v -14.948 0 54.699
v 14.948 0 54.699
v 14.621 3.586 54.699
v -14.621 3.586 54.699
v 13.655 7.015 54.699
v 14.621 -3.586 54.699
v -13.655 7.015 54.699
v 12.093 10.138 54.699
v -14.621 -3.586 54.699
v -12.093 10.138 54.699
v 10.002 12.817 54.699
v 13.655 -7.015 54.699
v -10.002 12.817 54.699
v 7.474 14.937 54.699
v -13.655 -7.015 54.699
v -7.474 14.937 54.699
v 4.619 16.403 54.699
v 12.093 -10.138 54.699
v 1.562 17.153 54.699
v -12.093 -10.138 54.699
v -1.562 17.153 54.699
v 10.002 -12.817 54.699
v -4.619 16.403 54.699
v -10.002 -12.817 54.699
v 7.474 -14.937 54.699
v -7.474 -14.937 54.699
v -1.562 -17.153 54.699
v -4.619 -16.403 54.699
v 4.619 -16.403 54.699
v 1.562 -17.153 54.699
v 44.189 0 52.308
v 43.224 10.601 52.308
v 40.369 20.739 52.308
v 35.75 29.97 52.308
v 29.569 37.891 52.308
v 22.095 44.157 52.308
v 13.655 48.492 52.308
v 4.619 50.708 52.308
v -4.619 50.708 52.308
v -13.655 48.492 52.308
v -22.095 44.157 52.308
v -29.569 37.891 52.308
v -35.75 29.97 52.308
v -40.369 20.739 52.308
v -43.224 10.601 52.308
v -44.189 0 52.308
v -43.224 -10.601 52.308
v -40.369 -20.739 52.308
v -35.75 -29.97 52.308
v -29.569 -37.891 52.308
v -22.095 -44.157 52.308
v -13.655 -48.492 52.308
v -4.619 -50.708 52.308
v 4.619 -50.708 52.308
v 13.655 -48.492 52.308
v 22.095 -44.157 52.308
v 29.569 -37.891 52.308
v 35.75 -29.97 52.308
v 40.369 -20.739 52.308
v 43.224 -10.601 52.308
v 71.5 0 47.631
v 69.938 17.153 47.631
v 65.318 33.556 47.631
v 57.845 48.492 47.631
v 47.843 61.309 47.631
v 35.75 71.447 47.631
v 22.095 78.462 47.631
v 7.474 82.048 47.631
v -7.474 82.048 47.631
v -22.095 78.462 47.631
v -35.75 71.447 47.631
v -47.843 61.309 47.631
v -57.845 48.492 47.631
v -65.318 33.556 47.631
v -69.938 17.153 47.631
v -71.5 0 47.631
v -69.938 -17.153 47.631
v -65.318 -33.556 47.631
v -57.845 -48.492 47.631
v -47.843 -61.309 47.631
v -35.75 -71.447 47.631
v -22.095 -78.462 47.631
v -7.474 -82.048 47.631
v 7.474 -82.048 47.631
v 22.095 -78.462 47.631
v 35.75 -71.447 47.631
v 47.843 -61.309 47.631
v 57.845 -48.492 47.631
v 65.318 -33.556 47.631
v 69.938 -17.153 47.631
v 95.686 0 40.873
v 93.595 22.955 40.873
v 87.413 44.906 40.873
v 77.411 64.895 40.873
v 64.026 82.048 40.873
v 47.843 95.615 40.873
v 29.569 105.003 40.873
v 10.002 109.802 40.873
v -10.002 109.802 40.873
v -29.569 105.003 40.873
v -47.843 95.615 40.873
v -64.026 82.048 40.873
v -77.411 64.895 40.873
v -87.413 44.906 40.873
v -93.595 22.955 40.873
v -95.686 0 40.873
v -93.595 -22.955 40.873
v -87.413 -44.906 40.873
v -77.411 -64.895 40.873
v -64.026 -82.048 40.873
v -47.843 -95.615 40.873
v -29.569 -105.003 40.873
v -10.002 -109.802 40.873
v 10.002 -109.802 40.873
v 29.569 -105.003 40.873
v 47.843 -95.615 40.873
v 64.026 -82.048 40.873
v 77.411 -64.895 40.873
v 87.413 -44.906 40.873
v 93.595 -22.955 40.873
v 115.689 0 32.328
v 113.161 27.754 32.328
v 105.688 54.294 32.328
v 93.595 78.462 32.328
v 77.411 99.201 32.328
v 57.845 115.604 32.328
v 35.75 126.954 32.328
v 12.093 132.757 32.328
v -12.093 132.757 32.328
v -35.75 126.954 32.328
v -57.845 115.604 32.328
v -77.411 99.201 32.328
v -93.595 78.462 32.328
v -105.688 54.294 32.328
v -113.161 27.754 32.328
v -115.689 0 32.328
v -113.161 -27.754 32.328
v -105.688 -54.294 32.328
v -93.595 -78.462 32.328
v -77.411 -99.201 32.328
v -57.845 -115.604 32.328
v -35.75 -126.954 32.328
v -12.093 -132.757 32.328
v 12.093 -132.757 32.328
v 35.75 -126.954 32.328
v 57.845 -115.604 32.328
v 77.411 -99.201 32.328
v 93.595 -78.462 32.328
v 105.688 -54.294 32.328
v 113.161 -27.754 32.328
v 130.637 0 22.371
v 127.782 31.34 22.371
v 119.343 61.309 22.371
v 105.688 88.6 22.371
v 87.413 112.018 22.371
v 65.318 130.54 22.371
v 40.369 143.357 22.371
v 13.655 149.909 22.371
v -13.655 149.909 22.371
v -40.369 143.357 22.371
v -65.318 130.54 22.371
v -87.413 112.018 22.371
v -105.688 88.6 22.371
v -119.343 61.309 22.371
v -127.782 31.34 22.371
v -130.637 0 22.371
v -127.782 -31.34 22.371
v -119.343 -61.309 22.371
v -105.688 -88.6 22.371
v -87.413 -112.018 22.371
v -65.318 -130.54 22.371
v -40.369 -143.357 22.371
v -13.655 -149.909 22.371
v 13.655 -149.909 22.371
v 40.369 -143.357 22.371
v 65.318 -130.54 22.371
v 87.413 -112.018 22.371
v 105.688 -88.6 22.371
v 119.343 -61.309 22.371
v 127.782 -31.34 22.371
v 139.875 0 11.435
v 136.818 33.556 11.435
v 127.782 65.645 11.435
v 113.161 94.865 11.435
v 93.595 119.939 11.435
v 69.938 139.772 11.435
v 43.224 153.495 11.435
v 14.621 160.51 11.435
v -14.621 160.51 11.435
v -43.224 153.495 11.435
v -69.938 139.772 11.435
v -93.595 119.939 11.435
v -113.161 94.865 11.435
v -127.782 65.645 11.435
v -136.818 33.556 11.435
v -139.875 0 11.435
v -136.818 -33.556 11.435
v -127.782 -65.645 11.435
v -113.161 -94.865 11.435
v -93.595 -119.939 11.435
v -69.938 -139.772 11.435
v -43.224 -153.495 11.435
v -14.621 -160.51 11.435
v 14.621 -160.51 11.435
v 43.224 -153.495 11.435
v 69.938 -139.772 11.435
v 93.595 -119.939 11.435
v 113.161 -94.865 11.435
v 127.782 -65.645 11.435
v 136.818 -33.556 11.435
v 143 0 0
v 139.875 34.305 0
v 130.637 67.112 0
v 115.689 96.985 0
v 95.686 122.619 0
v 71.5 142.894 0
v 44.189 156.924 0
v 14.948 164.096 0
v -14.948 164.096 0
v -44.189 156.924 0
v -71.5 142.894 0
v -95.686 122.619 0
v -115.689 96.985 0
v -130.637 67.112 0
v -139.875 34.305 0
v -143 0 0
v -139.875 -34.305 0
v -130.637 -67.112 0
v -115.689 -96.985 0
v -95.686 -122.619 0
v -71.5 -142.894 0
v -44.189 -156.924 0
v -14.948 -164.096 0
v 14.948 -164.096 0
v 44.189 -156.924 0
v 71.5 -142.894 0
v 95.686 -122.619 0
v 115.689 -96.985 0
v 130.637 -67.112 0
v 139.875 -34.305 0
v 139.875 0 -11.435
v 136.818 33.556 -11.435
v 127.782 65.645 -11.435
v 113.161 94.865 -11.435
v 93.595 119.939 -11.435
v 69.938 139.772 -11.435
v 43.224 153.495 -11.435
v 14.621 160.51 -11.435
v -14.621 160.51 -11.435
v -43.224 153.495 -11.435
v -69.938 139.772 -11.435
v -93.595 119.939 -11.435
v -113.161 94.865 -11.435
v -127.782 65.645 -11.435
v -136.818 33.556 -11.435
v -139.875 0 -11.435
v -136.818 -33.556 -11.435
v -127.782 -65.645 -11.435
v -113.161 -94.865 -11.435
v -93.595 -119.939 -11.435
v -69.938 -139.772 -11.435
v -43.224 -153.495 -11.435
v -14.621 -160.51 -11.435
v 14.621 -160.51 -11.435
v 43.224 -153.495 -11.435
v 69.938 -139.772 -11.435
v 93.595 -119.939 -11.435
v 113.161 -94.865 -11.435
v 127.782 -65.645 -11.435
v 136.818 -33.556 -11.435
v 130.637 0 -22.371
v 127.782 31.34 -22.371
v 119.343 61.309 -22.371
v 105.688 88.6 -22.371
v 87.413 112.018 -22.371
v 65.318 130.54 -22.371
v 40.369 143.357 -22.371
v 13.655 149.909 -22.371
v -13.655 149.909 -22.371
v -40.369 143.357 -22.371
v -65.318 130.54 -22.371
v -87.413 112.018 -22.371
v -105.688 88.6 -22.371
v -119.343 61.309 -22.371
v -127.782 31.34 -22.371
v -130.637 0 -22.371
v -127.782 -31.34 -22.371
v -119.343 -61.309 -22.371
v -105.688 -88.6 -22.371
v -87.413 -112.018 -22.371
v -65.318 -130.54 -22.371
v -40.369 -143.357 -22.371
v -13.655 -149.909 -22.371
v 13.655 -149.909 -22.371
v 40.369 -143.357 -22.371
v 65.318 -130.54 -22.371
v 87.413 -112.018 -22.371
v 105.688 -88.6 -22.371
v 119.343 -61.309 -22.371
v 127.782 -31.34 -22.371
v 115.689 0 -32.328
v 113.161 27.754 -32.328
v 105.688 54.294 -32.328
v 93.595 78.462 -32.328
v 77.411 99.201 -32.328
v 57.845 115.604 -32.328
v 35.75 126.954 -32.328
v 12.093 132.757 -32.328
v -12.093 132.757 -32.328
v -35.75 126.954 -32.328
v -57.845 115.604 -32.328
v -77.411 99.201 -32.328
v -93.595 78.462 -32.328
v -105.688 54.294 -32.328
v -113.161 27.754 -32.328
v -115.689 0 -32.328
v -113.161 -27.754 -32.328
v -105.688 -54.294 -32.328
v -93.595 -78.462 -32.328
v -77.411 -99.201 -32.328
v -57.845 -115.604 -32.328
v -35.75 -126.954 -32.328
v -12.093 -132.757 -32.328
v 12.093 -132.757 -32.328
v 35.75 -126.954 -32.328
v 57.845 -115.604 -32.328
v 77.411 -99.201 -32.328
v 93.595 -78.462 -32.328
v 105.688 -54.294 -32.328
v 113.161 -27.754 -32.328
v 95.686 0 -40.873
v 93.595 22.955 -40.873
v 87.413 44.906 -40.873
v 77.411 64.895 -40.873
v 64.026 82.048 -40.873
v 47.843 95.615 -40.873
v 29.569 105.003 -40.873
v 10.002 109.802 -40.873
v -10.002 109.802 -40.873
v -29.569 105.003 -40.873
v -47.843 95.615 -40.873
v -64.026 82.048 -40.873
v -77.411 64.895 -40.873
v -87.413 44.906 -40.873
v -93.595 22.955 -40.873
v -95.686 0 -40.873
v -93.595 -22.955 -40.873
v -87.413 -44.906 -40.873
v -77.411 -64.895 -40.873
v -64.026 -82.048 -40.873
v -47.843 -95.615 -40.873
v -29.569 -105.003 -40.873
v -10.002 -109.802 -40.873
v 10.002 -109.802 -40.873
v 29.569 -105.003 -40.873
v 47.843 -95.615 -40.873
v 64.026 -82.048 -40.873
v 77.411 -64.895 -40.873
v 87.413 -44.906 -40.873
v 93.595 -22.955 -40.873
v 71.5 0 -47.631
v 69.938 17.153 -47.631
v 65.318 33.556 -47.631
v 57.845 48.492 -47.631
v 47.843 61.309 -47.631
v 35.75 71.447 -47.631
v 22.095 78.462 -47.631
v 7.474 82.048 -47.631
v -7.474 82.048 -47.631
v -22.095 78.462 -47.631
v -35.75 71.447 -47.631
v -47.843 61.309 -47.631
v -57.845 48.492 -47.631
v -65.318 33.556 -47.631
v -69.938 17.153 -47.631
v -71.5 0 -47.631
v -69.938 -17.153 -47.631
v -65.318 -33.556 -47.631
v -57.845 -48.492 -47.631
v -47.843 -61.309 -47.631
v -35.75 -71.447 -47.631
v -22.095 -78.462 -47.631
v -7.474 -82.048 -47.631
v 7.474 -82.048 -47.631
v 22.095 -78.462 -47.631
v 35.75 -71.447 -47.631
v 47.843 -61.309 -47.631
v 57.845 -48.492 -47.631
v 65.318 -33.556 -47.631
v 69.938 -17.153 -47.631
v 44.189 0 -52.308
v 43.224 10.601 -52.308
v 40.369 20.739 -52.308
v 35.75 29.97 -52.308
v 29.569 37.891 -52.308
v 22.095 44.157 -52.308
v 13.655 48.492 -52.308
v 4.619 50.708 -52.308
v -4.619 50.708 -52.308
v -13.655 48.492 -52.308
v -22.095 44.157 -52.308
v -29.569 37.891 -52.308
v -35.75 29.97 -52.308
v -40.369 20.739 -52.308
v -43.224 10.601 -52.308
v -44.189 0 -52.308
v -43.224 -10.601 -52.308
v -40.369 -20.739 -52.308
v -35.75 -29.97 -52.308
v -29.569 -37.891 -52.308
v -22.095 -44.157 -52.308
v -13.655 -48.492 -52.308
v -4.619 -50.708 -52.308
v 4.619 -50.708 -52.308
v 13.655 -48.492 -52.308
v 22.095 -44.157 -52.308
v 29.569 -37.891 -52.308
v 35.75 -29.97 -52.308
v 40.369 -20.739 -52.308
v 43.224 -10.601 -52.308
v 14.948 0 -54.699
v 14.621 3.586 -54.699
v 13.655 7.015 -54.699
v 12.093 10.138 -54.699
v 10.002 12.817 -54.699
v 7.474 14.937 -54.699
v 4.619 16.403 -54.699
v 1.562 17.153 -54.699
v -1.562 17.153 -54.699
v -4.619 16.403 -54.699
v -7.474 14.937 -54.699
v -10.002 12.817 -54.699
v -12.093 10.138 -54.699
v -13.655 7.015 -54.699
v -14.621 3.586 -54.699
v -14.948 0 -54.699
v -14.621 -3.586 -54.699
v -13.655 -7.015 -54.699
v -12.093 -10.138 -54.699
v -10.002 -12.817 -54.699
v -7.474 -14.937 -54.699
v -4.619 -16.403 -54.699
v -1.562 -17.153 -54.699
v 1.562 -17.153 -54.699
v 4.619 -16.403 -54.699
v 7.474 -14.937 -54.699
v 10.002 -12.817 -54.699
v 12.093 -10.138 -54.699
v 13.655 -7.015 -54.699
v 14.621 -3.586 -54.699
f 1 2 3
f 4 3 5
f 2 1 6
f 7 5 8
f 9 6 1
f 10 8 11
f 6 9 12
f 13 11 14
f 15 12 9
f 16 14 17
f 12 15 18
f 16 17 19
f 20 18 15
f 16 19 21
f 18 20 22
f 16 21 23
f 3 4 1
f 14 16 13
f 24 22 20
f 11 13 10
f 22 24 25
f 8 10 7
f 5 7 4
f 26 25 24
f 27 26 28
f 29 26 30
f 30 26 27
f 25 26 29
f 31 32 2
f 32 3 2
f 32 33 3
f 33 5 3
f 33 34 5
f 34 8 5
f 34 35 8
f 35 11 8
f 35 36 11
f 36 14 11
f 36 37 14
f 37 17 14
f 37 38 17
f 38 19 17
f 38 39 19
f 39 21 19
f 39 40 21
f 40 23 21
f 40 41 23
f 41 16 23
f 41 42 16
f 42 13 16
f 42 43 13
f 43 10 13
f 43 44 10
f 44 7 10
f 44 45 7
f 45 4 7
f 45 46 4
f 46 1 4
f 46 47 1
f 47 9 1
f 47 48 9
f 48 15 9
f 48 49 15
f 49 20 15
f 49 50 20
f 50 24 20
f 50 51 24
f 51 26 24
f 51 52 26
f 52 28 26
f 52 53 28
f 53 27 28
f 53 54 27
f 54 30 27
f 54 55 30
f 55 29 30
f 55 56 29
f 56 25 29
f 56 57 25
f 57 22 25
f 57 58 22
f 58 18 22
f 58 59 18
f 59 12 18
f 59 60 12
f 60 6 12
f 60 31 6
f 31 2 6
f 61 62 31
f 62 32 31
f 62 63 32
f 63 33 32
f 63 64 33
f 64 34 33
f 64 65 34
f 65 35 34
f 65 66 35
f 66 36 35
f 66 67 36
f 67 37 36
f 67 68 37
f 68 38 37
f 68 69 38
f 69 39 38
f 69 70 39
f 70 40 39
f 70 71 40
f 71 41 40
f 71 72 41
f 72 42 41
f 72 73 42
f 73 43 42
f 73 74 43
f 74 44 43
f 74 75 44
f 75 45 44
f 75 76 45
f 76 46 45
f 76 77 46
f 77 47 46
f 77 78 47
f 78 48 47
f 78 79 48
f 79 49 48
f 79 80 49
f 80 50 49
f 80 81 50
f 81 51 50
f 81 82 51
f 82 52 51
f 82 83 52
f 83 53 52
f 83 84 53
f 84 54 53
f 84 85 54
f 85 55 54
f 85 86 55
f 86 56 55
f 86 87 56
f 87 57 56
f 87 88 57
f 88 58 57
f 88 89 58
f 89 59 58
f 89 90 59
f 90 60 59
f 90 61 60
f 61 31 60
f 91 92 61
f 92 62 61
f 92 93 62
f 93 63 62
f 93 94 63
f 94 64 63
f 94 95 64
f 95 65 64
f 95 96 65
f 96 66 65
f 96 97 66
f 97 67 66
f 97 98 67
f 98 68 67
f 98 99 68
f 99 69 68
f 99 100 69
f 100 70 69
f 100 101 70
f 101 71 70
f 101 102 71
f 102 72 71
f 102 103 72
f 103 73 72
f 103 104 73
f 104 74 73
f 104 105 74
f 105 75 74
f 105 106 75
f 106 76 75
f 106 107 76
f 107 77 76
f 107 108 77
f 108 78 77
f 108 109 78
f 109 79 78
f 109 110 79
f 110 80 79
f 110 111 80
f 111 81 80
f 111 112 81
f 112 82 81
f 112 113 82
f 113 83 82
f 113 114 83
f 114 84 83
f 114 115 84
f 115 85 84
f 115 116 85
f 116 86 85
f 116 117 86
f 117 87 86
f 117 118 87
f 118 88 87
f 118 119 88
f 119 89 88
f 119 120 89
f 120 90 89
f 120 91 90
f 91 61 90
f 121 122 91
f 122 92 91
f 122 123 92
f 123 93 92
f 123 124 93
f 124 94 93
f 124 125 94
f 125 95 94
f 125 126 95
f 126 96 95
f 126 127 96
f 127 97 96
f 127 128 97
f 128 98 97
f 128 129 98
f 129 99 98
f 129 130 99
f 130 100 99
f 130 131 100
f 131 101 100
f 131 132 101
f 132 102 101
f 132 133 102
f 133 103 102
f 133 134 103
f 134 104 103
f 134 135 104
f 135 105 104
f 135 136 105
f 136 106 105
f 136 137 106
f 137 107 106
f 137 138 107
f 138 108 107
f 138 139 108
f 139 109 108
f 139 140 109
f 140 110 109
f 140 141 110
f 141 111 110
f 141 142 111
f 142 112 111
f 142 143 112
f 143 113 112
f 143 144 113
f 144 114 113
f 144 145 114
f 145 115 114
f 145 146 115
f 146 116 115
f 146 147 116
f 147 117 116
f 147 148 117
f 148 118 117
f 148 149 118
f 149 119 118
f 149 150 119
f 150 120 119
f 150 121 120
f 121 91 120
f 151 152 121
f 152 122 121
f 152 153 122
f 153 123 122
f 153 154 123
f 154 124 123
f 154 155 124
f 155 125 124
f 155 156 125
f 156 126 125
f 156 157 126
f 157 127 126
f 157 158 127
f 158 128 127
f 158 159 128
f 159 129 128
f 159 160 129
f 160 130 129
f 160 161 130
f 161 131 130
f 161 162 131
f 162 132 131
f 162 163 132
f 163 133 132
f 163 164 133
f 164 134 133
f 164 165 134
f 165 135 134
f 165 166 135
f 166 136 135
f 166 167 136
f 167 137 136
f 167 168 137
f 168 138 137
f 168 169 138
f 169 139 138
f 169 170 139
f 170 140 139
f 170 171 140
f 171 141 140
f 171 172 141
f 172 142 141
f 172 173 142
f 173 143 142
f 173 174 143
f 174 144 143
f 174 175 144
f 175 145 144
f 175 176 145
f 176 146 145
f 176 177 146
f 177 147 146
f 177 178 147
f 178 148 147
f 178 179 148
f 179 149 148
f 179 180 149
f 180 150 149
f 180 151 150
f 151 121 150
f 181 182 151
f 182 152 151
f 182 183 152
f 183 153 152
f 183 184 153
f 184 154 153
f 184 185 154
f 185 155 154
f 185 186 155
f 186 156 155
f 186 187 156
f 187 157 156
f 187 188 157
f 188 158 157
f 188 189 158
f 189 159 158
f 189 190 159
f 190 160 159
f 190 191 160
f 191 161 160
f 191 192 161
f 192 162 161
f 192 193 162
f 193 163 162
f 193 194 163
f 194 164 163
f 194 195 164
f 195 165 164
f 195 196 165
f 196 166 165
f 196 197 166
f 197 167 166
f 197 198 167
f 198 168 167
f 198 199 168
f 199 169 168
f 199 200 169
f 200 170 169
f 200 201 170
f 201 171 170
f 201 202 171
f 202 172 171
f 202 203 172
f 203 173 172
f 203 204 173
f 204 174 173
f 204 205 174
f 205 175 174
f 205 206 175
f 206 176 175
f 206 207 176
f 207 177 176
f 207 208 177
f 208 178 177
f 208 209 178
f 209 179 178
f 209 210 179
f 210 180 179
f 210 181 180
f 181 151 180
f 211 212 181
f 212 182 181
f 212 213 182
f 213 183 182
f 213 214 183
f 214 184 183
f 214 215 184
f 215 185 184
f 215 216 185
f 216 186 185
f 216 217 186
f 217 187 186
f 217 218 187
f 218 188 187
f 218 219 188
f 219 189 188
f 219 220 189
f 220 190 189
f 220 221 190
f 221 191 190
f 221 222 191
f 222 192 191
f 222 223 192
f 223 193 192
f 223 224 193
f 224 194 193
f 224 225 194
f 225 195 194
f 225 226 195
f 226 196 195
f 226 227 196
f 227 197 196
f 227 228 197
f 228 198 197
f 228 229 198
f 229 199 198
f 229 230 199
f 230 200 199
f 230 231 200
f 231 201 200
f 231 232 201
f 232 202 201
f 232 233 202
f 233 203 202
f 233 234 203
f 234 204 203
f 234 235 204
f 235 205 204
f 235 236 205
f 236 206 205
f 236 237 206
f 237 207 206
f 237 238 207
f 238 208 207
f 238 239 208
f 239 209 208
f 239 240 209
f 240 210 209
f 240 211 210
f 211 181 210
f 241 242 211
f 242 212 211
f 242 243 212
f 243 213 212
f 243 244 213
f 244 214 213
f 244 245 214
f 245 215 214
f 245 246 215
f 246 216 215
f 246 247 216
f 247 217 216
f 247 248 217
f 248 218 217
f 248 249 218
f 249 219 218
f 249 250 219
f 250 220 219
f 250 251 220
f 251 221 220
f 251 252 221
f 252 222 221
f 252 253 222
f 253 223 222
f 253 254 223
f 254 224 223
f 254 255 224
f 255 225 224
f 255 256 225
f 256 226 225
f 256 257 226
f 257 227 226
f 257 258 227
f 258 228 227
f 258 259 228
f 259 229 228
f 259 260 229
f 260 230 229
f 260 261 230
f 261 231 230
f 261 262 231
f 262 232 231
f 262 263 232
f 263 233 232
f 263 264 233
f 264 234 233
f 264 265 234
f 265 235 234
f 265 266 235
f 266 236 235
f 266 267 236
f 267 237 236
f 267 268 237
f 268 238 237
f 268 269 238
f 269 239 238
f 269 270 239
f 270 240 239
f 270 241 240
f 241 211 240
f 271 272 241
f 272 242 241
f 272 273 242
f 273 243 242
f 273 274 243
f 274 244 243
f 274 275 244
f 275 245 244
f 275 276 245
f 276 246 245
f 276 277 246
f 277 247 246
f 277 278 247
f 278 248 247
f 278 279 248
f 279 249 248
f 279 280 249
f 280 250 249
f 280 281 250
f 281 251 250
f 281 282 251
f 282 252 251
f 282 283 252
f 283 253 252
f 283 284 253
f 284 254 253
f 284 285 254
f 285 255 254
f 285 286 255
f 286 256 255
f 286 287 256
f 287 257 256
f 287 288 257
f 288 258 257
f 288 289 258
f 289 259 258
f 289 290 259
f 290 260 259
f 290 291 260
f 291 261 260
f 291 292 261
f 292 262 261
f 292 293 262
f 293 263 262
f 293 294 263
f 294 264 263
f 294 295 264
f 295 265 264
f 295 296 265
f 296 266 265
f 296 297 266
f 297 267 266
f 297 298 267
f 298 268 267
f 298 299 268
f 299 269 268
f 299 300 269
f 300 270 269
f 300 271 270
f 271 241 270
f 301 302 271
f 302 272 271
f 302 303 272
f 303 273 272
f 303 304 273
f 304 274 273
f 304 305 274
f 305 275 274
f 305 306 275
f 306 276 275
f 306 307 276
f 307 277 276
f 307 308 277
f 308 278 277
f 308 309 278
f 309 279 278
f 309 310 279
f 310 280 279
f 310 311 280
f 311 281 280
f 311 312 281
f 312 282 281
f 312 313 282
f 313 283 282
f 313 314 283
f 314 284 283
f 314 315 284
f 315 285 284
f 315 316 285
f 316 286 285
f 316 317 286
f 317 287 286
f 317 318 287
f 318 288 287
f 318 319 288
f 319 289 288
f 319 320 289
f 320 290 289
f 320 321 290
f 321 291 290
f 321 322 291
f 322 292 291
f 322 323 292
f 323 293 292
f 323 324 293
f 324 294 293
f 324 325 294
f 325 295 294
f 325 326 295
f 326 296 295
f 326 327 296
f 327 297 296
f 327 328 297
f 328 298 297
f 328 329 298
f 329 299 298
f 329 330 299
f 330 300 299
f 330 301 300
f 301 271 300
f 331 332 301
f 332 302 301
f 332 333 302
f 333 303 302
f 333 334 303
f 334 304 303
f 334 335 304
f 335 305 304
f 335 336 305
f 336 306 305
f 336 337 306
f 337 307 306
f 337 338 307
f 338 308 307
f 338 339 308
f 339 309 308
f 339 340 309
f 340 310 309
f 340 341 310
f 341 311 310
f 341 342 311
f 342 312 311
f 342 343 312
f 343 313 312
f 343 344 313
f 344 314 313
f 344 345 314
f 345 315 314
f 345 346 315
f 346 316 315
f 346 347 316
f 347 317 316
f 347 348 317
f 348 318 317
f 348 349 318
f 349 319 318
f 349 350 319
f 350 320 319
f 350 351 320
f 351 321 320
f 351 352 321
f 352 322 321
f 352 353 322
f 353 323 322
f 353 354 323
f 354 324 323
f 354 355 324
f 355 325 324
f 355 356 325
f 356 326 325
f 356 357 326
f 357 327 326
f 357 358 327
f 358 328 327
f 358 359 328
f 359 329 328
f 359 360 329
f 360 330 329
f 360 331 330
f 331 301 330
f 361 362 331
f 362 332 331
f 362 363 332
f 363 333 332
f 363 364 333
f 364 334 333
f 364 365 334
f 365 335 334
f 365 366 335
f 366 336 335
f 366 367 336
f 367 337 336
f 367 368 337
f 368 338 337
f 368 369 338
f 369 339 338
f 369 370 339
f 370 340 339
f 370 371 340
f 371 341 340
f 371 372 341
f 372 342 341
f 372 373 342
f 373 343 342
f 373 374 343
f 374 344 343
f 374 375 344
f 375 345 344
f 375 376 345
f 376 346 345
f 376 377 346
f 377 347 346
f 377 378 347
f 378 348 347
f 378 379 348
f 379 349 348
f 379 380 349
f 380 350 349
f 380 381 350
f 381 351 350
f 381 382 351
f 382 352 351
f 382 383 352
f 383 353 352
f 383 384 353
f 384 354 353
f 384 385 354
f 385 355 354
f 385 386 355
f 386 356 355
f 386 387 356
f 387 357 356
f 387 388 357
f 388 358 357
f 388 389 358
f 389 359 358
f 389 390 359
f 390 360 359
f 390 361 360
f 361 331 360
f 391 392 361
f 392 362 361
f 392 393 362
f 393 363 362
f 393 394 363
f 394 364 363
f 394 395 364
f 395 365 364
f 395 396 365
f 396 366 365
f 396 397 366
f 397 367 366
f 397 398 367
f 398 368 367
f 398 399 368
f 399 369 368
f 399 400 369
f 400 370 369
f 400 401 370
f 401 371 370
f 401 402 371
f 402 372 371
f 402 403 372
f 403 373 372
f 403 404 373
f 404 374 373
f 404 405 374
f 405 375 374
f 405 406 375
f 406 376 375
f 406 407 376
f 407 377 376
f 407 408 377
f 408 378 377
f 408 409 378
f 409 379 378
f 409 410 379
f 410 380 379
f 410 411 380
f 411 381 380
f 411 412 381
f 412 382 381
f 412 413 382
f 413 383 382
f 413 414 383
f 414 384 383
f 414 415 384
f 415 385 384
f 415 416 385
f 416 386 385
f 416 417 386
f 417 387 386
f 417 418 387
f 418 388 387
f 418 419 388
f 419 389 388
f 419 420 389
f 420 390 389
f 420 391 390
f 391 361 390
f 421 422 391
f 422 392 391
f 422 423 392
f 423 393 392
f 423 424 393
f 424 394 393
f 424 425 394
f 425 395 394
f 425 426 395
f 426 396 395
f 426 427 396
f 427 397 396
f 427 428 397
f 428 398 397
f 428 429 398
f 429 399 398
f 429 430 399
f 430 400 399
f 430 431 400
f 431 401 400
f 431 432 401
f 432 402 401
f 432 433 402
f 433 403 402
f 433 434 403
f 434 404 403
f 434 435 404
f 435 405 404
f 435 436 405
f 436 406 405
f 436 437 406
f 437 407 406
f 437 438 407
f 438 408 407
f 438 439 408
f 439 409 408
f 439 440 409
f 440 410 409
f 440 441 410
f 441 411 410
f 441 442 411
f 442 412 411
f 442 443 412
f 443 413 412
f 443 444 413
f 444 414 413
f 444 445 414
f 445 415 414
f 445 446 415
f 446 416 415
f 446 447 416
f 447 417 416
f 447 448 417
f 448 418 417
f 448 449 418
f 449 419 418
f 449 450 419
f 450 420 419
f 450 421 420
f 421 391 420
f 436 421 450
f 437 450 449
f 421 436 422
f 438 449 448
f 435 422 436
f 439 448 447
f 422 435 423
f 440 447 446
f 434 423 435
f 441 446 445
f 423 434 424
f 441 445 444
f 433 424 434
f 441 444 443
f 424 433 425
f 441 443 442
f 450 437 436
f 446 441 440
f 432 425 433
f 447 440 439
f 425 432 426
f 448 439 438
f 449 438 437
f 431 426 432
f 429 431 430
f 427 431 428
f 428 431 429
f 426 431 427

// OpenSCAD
// Generated by SolidPython 1.0.1 on 2020-07-29 00:46:51


scale(v = [13, 15, 5]) {
	sphere(r = 11);
}
/***********************************************
*********      SolidPython code:      **********
************************************************
 
# import packages: SolidPython
from solid import *
from solid.utils import *
from itertools import chain, combinations, permutations


class Resize:

    def __init__(self, scad_file):
        self.scad_file = scad_file
        #self.scad_file = import_scad(scad_file)
        # cone/cylinder param:
        self.r1 = 0
        self.r2 = 0
        self.h = 0
        # rectangular prism param:
        self.w = 0
        self.l = 0
        # ellipse param:
        self.r = 0

    # import OpenScad code (file name corresponds to shape)


    # classify shape + parameters
    def assign(self, param1, param2, param3):
        if self.scad_file == 'cone.scad':
            self.r1 = param1
            self.r2 = param2
            self.h = param3
        elif self.scad_file == 'cylinder.scad':
            self.r1 = param1
            self.r2 = param2
            self.h = param3
        elif self.scad_file == 'rectangularPrism.scad':
            self.h = param1
            self.l = param2
            self.w = param3
        else:
            self.r = param1
            self.h = param2

    # resize parameters
    def iterate(self):
        x = range(3, 20, 2)
        i = 1
        if self.scad_file == 'cone.scad':
            tempList = list(permutations(x, 2))
            for temp in tempList:
                param1 = temp[0]
                param2 = temp[1]
                filepath = 'produced_scad_files/' + 'cone' + str(param1) + '_' + str(param2) + '_' + '.scad'
                scad_render_to_file(cylinder(h=param1, r1=param2, r2=0), filepath)

        elif self.scad_file == 'cylinder.scad':
            tempList = list(permutations(x, 3))
            for temp in tempList:
                param1 = temp[0]
                param2 = temp[1]
                filepath = 'produced_scad_files/' + 'cylinder' + str(param1) + '_' + str(param2) + '_' + '.scad'
                scad_render_to_file(cylinder(h=param1, r1=param2, r2=param2), filepath)

        elif self.scad_file == 'rectangularPrism.scad':
            tempList = list(permutations(x, 3))
            for temp in tempList:
                param1 = temp[0]
                param2 = temp[1]
                param3 = temp[2]
                filepath = 'produced_scad_files/' + 'rectangularPrism' + str(param1) + '_' + str(param2) + '_' + str(
                    param3) + '.scad'
                scad_render_to_file(cube(size=(param1, param2, param3)), filepath)

        elif self.scad_file == 'ellipse.scad':
            tempList = list(permutations(x, 4))
            for temp in tempList:
                param1 = temp[0]
                param2 = temp[1]
                param3 = temp[2]
                param4 = temp[3]
                filepath = 'produced_scad_files/' + 'ellipse' + str(param1) + '_' + str(param2) + '_' + str(param3) + '_' + str(param4) + '.scad'
                scad_render_to_file(scale([param1, param2, param3])(sphere(r=param4)), filepath)

    def render_to_scadfile(self):
        scad_render_to_file(scad, 'example.scad') 
 
************************************************/
